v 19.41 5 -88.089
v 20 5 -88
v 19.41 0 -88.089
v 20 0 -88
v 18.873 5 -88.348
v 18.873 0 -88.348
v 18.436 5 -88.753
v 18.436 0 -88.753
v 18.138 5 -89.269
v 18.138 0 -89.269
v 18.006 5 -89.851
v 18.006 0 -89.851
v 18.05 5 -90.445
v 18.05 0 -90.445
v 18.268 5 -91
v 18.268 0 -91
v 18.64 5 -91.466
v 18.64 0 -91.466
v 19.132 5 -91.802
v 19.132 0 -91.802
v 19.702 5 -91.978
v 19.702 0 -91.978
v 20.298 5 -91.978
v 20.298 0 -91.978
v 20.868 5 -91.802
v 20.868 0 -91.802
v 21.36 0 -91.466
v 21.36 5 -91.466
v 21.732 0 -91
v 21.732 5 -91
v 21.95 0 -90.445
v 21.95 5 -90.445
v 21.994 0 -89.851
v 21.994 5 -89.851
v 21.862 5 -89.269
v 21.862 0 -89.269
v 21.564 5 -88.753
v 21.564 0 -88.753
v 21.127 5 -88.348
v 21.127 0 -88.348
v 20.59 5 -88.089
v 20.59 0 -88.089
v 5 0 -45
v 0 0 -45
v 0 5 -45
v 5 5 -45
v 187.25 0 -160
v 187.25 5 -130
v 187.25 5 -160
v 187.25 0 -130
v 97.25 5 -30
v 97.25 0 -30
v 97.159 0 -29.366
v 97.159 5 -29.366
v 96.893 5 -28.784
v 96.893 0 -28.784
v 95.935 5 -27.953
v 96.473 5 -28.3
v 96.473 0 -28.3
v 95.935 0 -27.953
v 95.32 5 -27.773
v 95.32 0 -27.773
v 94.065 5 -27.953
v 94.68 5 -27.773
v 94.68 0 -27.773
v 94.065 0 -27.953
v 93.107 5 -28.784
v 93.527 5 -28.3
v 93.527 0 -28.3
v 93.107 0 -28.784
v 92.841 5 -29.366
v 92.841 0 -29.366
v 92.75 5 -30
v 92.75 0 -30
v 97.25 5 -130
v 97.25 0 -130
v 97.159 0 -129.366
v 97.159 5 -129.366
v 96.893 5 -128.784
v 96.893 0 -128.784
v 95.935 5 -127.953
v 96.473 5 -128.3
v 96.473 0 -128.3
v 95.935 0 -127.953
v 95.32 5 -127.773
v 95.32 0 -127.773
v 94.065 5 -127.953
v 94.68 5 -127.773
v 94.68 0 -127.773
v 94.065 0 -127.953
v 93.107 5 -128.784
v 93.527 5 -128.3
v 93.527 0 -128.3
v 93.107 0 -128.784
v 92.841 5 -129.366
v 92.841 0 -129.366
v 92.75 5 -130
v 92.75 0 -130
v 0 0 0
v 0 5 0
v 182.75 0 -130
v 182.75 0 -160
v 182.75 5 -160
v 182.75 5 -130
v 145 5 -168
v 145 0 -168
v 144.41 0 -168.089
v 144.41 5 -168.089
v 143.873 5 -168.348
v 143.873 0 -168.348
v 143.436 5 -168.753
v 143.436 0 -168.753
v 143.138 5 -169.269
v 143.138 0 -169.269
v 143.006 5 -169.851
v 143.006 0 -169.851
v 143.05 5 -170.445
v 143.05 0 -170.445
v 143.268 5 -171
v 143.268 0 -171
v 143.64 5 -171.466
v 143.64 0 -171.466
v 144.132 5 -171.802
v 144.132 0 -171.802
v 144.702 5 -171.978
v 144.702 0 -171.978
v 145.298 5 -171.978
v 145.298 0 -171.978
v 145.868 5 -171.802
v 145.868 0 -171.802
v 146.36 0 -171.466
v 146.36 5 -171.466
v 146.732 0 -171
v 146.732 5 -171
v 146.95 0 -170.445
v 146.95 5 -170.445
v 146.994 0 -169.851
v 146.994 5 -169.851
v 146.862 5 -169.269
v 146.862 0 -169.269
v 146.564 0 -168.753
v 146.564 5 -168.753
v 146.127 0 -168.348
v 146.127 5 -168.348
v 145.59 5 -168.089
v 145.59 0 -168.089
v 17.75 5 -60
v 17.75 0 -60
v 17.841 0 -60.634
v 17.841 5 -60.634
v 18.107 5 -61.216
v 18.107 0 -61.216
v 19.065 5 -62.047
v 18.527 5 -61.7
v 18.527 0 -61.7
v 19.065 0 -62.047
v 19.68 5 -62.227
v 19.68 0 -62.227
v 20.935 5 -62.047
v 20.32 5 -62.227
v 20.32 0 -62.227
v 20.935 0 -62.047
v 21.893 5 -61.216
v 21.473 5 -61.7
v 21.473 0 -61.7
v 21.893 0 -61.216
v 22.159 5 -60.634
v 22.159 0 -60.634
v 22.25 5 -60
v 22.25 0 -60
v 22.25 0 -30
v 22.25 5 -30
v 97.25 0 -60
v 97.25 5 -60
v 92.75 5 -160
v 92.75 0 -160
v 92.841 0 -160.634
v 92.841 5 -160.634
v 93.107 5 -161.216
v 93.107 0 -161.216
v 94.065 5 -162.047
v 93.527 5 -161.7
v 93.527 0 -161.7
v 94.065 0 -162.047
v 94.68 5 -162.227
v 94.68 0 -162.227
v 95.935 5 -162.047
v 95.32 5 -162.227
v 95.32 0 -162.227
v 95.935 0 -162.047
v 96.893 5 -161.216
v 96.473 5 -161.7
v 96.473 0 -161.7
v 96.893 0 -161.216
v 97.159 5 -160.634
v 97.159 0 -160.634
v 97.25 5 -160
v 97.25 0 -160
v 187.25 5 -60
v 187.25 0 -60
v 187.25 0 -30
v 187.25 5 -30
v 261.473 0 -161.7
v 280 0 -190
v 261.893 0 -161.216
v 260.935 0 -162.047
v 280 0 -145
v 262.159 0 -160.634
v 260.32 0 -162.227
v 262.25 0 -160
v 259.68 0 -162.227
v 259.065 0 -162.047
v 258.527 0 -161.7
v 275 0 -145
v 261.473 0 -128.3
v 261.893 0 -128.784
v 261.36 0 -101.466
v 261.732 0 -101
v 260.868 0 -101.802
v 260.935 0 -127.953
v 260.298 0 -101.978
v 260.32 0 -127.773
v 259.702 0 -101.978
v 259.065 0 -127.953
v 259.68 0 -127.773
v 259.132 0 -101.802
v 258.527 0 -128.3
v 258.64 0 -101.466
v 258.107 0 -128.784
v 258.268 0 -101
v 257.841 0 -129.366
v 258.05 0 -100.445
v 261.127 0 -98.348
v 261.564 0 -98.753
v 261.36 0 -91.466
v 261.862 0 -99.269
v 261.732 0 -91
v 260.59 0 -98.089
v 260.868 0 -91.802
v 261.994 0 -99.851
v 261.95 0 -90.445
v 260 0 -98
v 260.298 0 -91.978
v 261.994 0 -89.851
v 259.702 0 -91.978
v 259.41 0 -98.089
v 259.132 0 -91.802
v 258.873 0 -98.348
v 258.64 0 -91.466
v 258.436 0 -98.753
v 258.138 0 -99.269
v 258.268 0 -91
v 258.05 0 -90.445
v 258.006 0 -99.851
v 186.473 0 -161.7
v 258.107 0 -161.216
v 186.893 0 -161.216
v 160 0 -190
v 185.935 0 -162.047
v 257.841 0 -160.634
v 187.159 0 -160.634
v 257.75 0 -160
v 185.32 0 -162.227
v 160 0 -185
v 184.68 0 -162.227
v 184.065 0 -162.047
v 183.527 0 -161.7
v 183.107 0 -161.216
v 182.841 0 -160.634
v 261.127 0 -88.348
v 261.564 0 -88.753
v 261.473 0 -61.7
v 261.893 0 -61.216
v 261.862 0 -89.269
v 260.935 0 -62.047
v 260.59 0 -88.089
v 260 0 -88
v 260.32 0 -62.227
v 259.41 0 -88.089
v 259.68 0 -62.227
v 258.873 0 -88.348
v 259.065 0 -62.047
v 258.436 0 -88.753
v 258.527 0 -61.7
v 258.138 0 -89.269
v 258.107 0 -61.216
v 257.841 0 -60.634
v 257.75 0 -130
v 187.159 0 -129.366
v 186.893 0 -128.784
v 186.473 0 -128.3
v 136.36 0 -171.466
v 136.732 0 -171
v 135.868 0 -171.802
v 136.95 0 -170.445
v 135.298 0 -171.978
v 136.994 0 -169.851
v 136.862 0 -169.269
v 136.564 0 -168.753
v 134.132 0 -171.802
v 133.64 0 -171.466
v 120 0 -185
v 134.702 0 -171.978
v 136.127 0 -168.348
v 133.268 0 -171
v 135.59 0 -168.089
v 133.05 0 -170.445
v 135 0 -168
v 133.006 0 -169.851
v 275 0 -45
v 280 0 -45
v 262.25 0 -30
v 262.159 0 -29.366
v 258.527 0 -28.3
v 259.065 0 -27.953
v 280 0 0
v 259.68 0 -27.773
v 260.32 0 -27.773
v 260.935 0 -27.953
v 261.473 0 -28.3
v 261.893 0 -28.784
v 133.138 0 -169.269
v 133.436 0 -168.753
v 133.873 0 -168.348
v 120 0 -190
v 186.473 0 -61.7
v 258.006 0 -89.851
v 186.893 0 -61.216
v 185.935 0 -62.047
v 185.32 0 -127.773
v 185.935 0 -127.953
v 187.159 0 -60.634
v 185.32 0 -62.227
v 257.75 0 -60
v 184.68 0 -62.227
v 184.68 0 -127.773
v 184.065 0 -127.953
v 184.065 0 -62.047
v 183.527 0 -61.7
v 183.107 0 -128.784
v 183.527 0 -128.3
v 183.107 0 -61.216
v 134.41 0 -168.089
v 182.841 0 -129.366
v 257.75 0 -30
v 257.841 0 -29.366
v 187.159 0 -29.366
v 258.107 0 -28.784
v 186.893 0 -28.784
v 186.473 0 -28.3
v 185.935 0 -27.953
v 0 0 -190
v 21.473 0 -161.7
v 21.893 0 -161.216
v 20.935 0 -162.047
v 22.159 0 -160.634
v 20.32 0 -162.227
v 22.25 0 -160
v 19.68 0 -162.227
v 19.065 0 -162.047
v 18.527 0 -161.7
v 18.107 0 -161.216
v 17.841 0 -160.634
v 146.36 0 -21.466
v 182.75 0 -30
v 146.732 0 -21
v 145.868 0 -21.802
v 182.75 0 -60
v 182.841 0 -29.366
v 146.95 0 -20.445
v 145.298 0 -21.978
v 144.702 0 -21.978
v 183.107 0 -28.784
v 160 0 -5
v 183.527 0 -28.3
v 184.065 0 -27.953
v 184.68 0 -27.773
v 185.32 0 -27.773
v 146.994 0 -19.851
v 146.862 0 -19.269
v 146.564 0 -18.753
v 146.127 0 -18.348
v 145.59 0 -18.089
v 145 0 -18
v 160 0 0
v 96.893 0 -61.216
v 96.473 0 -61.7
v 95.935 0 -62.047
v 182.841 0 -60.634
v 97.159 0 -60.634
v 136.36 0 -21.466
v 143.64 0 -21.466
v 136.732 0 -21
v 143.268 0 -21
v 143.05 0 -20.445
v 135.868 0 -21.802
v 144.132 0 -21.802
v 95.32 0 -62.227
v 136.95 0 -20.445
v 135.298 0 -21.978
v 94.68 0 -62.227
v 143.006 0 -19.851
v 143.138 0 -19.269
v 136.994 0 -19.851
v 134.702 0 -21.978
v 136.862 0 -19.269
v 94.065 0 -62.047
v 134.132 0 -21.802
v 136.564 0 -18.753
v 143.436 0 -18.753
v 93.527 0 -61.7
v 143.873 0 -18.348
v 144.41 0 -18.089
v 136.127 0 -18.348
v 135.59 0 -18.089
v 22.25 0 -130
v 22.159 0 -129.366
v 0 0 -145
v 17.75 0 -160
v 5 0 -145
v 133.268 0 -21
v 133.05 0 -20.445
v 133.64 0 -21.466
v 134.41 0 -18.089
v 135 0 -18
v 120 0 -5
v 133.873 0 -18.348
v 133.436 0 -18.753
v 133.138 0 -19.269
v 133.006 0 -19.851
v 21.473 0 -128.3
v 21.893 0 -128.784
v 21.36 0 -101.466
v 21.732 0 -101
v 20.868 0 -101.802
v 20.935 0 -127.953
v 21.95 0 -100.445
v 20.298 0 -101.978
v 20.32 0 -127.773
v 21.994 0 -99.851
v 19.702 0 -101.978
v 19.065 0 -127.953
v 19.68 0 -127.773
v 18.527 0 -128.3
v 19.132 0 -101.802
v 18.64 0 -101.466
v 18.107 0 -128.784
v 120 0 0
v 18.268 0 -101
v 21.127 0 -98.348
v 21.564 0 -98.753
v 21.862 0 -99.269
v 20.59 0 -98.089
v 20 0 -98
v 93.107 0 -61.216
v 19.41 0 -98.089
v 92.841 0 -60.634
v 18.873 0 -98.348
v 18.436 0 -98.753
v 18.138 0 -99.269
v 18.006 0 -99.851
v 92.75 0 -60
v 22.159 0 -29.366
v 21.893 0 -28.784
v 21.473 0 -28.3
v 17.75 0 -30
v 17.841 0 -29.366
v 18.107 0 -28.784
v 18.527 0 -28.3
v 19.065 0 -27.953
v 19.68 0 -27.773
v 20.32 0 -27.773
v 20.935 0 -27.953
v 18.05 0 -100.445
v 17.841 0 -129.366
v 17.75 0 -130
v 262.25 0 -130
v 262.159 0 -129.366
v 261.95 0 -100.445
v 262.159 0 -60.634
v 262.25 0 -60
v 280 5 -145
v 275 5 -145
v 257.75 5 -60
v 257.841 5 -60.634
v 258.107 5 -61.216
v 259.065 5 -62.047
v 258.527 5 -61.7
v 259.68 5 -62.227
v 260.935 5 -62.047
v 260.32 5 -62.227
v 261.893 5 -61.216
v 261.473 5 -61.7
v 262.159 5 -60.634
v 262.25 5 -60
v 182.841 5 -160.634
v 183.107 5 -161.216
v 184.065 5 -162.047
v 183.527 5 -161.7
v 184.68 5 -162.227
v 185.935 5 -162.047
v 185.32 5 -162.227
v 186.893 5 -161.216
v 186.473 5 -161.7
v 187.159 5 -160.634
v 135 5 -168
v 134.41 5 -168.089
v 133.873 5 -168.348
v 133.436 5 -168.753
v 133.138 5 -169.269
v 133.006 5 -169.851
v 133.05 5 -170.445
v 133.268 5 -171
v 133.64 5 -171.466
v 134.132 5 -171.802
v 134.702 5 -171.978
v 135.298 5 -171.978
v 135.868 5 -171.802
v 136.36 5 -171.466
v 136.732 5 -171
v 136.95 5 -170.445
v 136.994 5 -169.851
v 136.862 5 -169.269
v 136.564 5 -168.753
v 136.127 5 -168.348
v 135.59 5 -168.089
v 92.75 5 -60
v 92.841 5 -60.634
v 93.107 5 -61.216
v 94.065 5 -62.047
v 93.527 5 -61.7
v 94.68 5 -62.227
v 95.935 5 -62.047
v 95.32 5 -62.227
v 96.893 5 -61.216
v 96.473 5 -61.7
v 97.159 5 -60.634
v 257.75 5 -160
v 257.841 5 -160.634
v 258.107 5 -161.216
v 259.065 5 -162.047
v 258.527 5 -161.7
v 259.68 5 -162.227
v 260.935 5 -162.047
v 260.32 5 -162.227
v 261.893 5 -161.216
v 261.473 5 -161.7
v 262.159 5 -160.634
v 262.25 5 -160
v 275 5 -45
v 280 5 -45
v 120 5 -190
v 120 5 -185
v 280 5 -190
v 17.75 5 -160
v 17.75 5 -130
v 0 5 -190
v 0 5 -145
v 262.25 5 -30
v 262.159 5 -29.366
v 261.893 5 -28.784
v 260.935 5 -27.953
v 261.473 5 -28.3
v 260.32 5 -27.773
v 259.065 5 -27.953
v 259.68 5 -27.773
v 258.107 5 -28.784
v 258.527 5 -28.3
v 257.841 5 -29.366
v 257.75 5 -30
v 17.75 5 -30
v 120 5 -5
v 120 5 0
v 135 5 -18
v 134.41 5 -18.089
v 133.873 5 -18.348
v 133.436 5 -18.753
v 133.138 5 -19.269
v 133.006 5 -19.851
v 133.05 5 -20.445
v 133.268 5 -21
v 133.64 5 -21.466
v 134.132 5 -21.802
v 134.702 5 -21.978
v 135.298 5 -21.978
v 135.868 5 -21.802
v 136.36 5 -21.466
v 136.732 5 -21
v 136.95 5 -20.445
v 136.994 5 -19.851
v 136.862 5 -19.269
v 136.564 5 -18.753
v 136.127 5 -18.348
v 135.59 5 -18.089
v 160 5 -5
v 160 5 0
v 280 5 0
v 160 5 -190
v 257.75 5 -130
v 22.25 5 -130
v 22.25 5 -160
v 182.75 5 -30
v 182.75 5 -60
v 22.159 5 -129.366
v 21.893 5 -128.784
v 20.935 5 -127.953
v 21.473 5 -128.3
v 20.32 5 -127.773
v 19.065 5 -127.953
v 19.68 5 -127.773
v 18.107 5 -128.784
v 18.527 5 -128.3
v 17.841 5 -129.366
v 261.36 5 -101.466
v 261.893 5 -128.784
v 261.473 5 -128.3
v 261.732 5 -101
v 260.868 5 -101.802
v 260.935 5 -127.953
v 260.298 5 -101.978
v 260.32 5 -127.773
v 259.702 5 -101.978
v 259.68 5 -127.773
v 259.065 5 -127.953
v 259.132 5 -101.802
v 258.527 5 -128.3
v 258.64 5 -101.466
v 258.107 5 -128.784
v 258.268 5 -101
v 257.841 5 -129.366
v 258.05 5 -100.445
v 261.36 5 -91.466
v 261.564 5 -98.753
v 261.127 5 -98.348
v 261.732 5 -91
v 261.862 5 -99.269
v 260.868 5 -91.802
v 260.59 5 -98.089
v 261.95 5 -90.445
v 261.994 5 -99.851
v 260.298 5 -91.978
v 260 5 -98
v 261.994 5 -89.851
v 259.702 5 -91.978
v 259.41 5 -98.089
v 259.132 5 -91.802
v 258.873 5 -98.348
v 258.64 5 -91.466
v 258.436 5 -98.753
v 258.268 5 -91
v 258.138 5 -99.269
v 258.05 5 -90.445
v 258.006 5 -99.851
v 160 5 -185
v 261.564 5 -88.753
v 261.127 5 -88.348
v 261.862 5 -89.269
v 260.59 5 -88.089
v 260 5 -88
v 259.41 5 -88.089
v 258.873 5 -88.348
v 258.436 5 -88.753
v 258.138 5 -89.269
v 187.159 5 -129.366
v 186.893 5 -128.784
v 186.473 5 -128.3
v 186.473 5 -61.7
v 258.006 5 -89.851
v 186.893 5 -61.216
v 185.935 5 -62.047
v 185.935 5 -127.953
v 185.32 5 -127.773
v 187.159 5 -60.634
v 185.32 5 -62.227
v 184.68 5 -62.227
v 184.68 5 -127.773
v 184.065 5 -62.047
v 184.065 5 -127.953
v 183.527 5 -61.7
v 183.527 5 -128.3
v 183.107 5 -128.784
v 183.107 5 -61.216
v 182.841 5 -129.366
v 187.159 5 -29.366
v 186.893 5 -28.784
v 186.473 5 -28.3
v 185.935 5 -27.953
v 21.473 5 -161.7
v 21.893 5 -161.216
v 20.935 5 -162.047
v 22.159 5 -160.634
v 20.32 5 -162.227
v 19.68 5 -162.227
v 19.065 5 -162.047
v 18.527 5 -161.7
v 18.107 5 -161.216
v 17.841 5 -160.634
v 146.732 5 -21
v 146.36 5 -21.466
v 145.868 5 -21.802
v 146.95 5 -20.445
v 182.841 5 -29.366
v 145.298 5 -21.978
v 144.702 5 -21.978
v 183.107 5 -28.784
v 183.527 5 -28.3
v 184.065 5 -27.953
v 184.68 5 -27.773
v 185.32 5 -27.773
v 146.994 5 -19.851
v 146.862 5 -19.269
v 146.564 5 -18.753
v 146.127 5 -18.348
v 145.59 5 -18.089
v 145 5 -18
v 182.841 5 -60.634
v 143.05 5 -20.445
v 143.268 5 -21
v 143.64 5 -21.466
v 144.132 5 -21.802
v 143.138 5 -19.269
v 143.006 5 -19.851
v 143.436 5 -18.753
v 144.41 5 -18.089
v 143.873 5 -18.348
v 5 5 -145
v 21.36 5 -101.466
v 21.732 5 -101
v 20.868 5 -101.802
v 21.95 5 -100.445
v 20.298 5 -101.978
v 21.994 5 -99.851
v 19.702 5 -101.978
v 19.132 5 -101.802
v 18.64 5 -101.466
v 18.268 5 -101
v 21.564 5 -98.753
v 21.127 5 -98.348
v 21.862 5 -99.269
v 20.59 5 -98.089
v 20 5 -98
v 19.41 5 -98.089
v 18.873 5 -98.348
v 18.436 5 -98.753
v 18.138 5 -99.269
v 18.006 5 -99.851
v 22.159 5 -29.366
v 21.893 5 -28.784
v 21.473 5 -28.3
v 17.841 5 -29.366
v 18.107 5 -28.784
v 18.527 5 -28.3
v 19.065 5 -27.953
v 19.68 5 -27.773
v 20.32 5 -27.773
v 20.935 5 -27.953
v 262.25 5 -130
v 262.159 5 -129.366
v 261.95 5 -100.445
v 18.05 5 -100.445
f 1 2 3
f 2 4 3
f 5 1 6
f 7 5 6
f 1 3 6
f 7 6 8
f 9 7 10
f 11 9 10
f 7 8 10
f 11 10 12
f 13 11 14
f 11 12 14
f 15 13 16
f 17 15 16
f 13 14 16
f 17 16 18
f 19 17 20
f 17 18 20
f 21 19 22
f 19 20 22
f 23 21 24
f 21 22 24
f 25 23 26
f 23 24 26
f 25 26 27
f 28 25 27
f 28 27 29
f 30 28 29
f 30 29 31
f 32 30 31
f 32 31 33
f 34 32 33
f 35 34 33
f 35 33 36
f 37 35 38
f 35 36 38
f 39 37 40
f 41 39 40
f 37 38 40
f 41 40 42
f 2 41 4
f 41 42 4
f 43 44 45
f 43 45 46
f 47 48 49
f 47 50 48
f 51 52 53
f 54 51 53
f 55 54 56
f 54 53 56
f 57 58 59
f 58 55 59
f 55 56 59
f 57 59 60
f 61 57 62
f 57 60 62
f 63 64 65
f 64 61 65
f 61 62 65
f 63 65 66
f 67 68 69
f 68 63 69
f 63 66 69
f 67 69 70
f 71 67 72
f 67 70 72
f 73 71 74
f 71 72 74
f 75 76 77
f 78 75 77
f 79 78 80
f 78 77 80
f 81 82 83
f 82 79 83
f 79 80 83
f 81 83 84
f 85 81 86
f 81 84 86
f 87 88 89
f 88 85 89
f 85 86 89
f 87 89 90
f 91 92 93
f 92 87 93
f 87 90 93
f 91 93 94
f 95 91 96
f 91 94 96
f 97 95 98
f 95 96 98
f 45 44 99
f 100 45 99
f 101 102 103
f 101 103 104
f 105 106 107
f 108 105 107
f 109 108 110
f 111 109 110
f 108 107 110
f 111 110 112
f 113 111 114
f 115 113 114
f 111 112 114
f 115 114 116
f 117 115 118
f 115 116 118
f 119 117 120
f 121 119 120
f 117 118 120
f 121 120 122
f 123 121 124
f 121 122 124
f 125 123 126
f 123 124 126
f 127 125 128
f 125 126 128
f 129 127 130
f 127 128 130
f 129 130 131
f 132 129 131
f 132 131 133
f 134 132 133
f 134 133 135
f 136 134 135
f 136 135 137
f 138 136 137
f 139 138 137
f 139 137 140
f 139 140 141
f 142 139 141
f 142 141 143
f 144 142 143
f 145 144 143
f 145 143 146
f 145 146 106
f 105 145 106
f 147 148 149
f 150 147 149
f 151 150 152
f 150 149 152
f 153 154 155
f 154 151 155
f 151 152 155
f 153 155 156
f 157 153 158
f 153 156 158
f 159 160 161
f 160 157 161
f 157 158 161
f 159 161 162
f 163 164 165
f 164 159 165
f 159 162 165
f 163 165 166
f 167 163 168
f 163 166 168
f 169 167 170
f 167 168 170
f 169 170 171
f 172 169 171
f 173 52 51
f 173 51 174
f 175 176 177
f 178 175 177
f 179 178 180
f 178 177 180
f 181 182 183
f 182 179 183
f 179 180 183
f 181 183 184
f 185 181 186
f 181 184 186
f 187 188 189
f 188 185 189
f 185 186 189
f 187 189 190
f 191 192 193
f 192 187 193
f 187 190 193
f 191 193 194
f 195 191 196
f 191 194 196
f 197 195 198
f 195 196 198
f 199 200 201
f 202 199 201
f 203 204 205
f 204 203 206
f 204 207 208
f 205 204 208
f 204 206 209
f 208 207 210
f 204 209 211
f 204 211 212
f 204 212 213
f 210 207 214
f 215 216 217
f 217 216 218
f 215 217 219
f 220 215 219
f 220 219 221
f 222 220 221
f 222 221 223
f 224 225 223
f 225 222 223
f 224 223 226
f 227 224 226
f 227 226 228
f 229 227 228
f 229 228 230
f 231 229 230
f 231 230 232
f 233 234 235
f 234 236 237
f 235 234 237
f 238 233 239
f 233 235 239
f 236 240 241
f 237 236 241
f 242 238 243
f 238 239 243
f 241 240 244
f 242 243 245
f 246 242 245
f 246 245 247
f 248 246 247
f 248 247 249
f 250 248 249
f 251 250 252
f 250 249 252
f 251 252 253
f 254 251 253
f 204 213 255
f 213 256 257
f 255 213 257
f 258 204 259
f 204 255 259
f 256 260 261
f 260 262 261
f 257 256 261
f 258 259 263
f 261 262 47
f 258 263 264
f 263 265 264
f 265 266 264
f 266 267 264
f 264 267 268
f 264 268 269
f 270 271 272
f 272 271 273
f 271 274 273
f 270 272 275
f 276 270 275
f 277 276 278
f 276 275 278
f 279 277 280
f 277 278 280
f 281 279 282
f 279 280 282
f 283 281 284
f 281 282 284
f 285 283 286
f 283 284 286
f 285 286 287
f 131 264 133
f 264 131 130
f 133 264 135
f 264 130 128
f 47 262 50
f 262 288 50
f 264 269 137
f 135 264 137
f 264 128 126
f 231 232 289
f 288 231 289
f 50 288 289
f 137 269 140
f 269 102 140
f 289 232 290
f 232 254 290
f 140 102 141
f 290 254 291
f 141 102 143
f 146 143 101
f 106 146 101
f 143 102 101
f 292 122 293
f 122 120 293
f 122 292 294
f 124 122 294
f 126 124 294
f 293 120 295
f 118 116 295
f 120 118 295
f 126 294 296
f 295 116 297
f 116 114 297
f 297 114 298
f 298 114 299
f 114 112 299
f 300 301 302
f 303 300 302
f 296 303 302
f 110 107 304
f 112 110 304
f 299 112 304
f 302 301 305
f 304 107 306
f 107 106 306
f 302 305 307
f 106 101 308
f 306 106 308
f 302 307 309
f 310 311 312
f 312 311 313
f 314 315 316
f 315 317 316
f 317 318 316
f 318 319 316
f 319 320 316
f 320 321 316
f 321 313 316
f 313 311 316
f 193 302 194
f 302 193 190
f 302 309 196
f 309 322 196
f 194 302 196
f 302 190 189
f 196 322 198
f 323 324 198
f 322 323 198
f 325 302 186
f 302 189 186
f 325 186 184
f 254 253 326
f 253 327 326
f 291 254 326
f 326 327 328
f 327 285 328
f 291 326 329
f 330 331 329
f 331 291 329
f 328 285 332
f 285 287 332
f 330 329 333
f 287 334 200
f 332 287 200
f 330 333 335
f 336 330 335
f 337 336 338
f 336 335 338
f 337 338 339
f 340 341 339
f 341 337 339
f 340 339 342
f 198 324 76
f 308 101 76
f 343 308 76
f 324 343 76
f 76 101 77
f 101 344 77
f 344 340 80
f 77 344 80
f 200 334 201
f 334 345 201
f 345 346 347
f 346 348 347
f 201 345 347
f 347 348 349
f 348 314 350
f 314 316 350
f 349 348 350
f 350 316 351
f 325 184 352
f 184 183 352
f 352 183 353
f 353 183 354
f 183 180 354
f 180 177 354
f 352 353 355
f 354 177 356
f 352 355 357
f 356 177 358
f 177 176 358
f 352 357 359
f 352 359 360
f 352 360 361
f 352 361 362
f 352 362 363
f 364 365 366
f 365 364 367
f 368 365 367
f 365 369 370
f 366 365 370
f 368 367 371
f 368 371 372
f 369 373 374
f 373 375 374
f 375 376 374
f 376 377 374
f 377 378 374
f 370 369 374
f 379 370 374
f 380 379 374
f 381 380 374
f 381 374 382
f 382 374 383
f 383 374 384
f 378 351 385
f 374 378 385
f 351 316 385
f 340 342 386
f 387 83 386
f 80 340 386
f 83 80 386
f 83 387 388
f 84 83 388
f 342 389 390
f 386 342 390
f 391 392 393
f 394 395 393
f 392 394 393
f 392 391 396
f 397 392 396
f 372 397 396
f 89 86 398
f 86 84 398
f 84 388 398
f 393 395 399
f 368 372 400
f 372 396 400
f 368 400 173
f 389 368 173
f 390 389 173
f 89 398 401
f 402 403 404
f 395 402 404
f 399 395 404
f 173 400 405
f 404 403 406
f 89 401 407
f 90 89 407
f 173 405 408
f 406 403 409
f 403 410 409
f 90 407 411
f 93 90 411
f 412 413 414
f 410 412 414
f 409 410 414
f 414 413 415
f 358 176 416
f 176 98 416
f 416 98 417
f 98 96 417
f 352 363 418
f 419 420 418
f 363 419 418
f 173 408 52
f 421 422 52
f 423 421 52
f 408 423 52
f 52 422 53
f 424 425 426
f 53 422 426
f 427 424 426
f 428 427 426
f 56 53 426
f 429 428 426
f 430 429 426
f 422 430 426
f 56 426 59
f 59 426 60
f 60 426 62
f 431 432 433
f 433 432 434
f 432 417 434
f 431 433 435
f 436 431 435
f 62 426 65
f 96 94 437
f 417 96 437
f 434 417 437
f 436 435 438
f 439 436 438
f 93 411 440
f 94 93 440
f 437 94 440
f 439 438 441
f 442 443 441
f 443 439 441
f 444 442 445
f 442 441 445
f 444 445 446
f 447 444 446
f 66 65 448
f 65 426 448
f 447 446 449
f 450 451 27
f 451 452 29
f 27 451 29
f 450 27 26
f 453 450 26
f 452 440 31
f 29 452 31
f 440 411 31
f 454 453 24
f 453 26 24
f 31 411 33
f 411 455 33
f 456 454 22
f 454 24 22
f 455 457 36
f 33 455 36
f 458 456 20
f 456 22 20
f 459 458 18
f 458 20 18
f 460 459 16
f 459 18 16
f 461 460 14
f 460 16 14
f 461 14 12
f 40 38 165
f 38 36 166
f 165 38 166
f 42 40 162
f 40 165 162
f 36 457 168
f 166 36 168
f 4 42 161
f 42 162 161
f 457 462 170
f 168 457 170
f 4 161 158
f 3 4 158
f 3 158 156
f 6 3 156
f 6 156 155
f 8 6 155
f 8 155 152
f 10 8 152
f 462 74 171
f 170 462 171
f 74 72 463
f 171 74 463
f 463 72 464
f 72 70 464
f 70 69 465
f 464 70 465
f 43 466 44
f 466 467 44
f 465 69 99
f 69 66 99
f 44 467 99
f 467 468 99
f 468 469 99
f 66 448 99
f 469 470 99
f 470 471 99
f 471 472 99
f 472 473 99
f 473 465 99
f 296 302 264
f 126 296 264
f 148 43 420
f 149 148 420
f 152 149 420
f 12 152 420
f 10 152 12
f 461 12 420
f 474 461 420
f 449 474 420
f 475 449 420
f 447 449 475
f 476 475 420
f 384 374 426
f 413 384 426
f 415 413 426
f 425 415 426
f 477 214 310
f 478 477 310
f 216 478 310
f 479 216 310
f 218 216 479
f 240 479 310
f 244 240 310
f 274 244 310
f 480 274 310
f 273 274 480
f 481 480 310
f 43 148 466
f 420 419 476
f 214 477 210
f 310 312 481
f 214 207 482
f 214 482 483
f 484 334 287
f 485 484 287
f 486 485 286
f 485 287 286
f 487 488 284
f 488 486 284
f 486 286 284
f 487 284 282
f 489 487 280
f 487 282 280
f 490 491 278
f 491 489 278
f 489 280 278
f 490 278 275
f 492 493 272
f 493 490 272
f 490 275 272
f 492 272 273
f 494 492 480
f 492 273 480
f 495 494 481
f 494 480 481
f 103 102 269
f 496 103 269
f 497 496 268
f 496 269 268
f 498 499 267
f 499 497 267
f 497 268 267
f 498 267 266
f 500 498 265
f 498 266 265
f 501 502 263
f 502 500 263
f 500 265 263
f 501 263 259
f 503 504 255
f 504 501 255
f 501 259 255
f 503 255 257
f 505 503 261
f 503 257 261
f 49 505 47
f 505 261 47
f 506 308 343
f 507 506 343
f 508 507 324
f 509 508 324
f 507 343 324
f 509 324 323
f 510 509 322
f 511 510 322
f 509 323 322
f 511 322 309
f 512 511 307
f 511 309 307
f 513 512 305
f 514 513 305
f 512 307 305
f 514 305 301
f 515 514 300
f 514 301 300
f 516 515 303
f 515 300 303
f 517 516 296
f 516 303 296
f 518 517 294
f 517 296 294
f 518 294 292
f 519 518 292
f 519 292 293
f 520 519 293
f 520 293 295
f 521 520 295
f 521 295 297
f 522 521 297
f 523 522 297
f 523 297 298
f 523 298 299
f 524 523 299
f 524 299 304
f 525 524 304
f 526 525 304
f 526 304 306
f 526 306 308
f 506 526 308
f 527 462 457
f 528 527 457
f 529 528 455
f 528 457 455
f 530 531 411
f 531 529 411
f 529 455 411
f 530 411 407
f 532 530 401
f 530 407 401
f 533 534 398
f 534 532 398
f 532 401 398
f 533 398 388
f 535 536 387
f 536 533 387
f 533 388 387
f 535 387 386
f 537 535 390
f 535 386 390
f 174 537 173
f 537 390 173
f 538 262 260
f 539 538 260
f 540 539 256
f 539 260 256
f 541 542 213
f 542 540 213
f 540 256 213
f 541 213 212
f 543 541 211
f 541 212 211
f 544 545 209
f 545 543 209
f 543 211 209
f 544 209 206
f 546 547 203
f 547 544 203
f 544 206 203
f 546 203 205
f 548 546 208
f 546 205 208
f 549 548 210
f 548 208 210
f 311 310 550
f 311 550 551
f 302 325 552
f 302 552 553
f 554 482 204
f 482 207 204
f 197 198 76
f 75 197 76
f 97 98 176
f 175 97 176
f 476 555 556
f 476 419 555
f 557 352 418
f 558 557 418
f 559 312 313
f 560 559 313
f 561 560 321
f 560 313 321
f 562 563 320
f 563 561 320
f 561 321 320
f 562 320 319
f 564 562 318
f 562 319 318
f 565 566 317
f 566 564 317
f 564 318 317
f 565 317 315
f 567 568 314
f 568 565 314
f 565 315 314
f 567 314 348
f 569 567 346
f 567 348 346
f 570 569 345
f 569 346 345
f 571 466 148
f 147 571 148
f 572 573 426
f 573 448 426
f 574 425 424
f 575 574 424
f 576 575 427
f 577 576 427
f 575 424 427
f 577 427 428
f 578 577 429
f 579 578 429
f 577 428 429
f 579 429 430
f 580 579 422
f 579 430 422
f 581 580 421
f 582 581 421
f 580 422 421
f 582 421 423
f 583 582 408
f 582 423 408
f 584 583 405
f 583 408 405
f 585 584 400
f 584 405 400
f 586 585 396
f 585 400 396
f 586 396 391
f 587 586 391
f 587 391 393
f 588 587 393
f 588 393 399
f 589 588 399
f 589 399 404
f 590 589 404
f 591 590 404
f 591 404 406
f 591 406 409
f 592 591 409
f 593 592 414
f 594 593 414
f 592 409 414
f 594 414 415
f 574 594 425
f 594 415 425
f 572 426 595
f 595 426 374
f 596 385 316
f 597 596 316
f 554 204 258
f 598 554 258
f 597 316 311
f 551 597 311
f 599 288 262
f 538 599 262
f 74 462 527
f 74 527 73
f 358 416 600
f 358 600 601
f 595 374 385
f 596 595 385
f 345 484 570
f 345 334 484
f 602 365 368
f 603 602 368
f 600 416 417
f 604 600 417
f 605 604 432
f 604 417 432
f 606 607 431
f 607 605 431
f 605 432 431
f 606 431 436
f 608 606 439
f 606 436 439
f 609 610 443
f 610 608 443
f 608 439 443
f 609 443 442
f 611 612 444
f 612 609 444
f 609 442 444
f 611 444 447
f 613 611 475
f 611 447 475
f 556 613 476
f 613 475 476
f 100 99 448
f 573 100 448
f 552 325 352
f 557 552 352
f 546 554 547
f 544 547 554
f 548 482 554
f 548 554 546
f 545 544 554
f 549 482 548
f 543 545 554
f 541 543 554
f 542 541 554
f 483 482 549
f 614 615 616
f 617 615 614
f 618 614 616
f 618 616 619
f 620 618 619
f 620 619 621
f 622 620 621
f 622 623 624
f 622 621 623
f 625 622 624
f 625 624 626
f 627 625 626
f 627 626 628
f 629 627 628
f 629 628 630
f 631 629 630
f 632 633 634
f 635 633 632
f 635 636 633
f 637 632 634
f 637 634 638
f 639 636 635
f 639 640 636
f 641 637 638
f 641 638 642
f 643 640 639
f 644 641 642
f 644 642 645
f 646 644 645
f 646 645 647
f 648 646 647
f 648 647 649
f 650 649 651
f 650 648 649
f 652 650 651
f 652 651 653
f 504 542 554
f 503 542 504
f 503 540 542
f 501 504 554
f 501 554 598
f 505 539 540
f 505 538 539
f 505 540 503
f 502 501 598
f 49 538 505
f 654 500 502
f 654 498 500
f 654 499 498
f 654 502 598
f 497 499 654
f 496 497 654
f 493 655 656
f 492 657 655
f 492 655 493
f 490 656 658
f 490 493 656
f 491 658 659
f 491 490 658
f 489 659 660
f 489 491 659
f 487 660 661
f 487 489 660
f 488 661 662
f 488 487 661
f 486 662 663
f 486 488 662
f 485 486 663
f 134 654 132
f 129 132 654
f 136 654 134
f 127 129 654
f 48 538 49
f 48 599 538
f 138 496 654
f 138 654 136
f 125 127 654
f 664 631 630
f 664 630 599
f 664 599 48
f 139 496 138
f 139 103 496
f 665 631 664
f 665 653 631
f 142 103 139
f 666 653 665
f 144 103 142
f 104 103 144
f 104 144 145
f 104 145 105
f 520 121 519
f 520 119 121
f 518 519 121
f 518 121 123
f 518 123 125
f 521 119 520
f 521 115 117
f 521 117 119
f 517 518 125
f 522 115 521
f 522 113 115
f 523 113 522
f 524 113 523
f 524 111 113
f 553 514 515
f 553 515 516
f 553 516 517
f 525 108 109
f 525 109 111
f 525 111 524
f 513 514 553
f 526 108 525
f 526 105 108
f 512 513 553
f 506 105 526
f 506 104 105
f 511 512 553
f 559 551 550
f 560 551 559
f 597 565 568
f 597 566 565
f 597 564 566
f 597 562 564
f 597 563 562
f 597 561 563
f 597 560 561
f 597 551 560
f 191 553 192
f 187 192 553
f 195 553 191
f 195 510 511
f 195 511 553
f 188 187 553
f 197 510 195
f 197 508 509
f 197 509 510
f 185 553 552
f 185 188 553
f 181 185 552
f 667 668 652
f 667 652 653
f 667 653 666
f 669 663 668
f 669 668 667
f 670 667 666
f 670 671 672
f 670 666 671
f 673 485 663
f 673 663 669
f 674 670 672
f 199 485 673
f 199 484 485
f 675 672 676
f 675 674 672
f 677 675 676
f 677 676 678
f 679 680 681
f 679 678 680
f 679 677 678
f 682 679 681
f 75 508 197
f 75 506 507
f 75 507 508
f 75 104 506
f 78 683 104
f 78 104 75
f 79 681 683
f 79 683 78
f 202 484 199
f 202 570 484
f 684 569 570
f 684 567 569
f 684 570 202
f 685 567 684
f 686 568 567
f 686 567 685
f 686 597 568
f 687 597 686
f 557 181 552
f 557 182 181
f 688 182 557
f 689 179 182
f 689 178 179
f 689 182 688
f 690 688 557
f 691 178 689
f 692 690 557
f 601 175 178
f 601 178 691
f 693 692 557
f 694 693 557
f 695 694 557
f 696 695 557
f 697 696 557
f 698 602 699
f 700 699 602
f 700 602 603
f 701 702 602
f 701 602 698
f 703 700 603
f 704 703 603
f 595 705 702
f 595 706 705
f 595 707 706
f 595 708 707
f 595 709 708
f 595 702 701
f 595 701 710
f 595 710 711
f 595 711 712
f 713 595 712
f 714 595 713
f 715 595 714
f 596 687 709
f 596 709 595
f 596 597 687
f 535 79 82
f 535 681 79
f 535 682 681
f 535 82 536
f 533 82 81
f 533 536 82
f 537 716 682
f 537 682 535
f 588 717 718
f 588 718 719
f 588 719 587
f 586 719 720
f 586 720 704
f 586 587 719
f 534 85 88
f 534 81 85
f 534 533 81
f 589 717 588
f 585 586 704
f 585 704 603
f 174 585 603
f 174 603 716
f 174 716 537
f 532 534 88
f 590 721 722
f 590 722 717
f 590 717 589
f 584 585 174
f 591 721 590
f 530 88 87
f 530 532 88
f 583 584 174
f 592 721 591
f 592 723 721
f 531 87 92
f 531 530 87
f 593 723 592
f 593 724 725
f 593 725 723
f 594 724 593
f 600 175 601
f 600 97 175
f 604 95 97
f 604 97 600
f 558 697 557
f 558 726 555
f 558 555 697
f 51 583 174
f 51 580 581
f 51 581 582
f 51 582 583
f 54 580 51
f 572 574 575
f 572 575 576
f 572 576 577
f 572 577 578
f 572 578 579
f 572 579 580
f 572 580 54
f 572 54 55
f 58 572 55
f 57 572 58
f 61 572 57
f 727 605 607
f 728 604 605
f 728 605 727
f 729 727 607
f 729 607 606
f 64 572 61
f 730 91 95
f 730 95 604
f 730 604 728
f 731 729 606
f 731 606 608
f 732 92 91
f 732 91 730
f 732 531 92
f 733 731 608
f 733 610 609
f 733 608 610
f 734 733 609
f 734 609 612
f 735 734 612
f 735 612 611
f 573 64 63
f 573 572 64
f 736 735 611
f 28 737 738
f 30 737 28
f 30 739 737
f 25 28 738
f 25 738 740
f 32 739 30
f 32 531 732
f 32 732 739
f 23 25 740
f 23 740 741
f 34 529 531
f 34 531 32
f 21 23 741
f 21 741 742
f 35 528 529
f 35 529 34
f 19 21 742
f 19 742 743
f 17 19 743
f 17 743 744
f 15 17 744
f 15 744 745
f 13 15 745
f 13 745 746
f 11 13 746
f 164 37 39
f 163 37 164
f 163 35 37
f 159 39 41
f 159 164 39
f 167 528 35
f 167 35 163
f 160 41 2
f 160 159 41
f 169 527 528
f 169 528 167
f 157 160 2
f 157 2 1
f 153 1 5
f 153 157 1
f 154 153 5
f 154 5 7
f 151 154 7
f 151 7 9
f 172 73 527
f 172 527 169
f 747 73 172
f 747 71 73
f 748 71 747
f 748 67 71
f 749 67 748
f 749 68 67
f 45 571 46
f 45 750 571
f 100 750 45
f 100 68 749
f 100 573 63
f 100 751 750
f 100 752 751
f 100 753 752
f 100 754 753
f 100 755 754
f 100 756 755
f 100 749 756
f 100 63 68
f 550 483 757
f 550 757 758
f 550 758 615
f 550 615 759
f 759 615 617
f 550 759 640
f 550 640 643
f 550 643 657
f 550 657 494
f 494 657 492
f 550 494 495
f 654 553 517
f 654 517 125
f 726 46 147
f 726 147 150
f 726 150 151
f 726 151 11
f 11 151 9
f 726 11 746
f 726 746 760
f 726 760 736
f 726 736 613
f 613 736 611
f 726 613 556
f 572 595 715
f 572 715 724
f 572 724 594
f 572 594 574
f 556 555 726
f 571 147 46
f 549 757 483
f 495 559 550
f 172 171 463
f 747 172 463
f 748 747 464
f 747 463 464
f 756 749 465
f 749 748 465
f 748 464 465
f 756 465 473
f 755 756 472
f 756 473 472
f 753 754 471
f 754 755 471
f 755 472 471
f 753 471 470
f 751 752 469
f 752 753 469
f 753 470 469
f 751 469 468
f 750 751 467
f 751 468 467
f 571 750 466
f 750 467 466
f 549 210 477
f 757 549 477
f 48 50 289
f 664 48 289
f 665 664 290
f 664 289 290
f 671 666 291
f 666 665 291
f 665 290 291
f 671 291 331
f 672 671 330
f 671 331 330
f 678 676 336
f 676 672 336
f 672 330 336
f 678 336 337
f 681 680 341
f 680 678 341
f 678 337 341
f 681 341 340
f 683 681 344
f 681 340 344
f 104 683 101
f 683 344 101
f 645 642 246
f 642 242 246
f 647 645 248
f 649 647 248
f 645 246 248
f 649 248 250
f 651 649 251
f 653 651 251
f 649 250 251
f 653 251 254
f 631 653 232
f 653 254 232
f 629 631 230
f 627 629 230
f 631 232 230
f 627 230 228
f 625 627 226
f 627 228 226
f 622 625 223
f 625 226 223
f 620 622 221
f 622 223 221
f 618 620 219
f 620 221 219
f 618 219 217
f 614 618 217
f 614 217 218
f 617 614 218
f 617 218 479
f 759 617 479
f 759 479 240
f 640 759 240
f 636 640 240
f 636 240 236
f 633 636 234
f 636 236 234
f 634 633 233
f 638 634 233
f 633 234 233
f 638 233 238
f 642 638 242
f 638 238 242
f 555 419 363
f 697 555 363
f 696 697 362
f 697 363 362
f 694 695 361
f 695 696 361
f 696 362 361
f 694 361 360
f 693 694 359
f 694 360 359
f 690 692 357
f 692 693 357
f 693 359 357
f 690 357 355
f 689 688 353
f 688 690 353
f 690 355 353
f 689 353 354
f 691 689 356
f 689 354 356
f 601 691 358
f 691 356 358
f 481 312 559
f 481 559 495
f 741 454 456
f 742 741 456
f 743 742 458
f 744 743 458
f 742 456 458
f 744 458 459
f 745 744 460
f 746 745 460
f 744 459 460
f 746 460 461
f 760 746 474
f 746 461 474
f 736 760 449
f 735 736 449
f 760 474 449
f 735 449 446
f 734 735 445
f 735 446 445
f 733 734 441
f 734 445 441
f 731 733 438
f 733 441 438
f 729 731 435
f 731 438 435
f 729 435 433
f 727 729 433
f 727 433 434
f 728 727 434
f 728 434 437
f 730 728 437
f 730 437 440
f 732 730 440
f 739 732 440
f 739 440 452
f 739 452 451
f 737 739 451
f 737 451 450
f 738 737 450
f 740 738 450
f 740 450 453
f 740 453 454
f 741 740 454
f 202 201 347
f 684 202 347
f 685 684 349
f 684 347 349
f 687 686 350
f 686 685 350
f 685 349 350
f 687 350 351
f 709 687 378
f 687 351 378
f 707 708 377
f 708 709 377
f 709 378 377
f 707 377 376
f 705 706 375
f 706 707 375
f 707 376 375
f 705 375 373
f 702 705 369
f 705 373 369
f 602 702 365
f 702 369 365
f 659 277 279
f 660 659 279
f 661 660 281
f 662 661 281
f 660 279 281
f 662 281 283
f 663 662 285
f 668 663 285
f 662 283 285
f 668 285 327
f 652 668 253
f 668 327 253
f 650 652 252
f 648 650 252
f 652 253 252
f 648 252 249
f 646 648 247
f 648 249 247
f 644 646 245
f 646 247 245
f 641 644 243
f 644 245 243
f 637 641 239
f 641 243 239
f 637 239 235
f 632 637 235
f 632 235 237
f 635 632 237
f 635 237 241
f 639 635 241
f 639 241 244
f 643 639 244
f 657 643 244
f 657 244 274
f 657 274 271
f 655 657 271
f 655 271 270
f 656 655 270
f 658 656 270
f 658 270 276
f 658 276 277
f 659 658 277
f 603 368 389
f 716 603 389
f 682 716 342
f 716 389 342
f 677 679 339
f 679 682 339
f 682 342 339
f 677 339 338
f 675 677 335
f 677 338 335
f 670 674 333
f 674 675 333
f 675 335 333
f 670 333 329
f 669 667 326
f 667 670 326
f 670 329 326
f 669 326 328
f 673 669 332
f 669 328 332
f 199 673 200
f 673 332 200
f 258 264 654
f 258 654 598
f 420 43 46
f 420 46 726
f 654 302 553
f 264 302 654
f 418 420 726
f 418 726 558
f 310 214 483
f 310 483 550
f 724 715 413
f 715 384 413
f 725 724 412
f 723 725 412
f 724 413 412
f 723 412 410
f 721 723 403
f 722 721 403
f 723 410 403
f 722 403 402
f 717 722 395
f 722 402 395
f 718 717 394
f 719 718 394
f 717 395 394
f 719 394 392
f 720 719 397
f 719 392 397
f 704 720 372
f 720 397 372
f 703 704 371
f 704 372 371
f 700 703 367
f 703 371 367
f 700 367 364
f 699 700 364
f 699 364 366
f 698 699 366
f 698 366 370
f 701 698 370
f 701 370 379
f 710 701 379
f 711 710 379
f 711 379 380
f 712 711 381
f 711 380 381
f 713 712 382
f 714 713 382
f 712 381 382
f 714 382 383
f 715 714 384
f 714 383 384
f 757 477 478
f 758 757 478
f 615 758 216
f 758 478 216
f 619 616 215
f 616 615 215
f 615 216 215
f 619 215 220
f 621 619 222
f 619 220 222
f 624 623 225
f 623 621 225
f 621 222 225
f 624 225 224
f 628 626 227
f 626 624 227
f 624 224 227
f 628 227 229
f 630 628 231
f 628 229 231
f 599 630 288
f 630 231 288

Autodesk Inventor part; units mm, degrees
ref_plane "YZ Plane" through (0, 0, 0) normal (1, 0, 0) x (0, 1, 0)
ref_plane "XZ Plane" through (0, 0, 0) normal (0, 1, 0) x (-1, 0, 0)
ref_plane "XY Plane" through (0, 0, 0) normal (0, 0, 1) x (1, 0, 0)
sketch "Sketch1" plane through (0, 0, 0) normal (0, 1, 0) x (-1, 0, 0)
  line L0 (0, 0) -> (-280, 0)
  line L1 (-280, 0) -> (-280, -190)
  line L2 (-280, -190) -> (0, -190)
  line L3 (5, -95) -> (-280, -95) construction
  line L4 (-140, 0) -> (-140, -190) construction
  line L5 (-57.5, 0) -> (-57.5, -190) construction
  line L6 (-203, 0) -> (-203, -190) construction
  line L7 (-20, -160) -> (-20, -130) construction
  line L8 (-20, -160) -> (-20, -130) construction
  line L9 (-17.75, -160) -> (-17.75, -130)
  line L10 (-22.25, -130) -> (-22.25, -160)
  arc A0 (-22.25, -160) -> (-17.75, -160) centre (-20, -160) ccw
  arc A1 (-17.75, -130) -> (-22.25, -130) centre (-20, -130) ccw
  line L11 (-95, -160) -> (-95, -130) construction
  line L12 (-95, -160) -> (-95, -130) construction
  line L13 (-97.25, -160) -> (-97.25, -130)
  line L14 (-92.75, -130) -> (-92.75, -160)
  arc A2 (-97.25, -160) -> (-92.75, -160) centre (-95, -160) ccw
  arc A3 (-92.75, -130) -> (-97.25, -130) centre (-95, -130) ccw
  line L15 (-160, -190) -> (-120, -190)
  line L16 (-120, -190) -> (-120, -185)
  line L17 (-120, -185) -> (-160, -185)
  line L18 (-160, -185) -> (-160, -190)
  line L19 (-260, -160) -> (-260, -130) construction
  line L20 (-260, -160) -> (-260, -130) construction
  line L21 (-262.25, -160) -> (-262.25, -130)
  line L22 (-257.75, -130) -> (-257.75, -160)
  arc A4 (-262.25, -160) -> (-257.75, -160) centre (-260, -160) ccw
  arc A5 (-257.75, -130) -> (-262.25, -130) centre (-260, -130) ccw
  line L23 (-187.25, -130) -> (-187.25, -160)
  line L24 (-185, -160) -> (-185, -130) construction
  line L25 (-182.75, -160) -> (-182.75, -130)
  arc A6 (-187.25, -160) -> (-182.75, -160) centre (-185, -160) ccw
  line L26 (-185, -160) -> (-185, -130) construction
  arc A7 (-182.75, -130) -> (-187.25, -130) centre (-185, -130) ccw
  line L27 (-140, -190) -> (-140, 0) construction
  line L28 (-20, -30) -> (-20, -60) construction
  line L29 (-20, -30) -> (-20, -60) construction
  line L30 (-17.75, -30) -> (-17.75, -60)
  line L31 (-22.25, -60) -> (-22.25, -30)
  arc A8 (-17.75, -30) -> (-22.25, -30) centre (-20, -30) ccw
  arc A9 (-22.25, -60) -> (-17.75, -60) centre (-20, -60) ccw
  line L32 (-92.75, -60) -> (-92.75, -30)
  line L33 (-95, -30) -> (-95, -60) construction
  line L34 (-97.25, -30) -> (-97.25, -60)
  arc A10 (-92.75, -30) -> (-97.25, -30) centre (-95, -30) ccw
  line L35 (-95, -30) -> (-95, -60) construction
  arc A11 (-97.25, -60) -> (-92.75, -60) centre (-95, -60) ccw
  line L36 (-160, 0) -> (-120, 0)
  line L37 (-120, 0) -> (-120, -5)
  line L38 (-120, -5) -> (-160, -5)
  line L39 (-160, -5) -> (-160, 0)
  arc A12 (-257.75, -30) -> (-262.25, -30) centre (-260, -30) ccw
  line L40 (-257.75, -60) -> (-257.75, -30)
  line L41 (-260, -30) -> (-260, -60) construction
  line L42 (-260, -30) -> (-260, -60) construction
  arc A13 (-262.25, -60) -> (-257.75, -60) centre (-260, -60) ccw
  line L43 (-262.25, -30) -> (-262.25, -60)
  line L44 (-187.25, -60) -> (-187.25, -30)
  line L45 (-185, -30) -> (-185, -60) construction
  line L46 (-185, -30) -> (-185, -60) construction
  arc A14 (-187.25, -60) -> (-182.75, -60) centre (-185, -60) ccw
  line L47 (-182.75, -30) -> (-182.75, -60)
  arc A15 (-182.75, -30) -> (-187.25, -30) centre (-185, -30) ccw
  line L48 (-280, -42.5) -> (-280, -92.5)
  line L49 (-280, -92.5) -> (-280, -145)
  line L50 (-280, -145) -> (-275, -145)
  line L51 (-275, -145) -> (-275, -45)
  line L52 (-275, -45) -> (-280, -45)
  line L53 (-280, -45) -> (-280, -42.5)
  line L54 (5, -45) -> (-5, -45)
  line L55 (-5, -45) -> (-5, -145)
  line L56 (-5, -145) -> (5, -145)
  line L57 (0, -190) -> (0, 0)
  point P0 (-20, -145)
  point P1 (-95, -145)
  point P2 (-260, -145)
  point P3 (-185, -145)
  point P4 (-20, -45)
  point P5 (-95, -45)
  point P6 (-260, -45)
  point P7 (-185, -45)
  point P8 (-95, -145)
  point P9 (-20, -145)
  point P10 (-280, -45)
  point P11 (-160, -190)
  point P12 (-120, -190)
  point P13 (-120, 0)
  point P14 (-160, 0)
  point P15 (-260, -145)
  point P16 (0, -45)
  point P17 (0, -145)
  dimension "d2" = 30
  dimension "d4" = 30
  dimension "d6" = 2.25
  dimension "d9" = 40
  dimension "d13" = 0
  dimension "d14" = 5
  dimension "d16" = 20
  dimension "d21" = 10
  dimension "d22" = 5
  dimension "d26" = 50
  dimension "d27" = 50
  dimension "d28" = 0
  dimension "d30" = 190
  dimension "d32" = 75
  dimension "d34" = 100
  dimension "d36" = 50
  dimension "d56" = 20
  dimension "d57" = 280
extrude "Extrusion1" add sketch "Sketch1" along normal blind 5 contours L57 L54 L55 L56 L2 L16 L17 L18 L1 L50 L51 L52 L0 L39 L38 L37
sketch "Sketch2" plane through (0, 5, 0) normal (0, 1, 0) x (1, 0, 0)
  line L0 (160, 185) -> (120, 185) projected
  line L1 (120, 185) -> (120, 190) projected
  line L2 (160, 5) -> (160, 0) projected
  line L3 (160, 0) -> (280, 0) projected
  line L4 (5, 145) -> (5, 45) projected
  point P0 (0, 0)
  point P1 (135, 20)
  point P2 (145, 20)
  point P3 (135, 170)
  point P4 (145, 170)
  point P5 (20, 90)
  point P6 (20, 100)
  dimension "d44" = 10
  dimension "d45" = 10
  dimension "d46" = 10
  dimension "d47" = 15
  dimension "d48" = 15
  dimension "d49" = 15
  dimension "d50" = 15
  dimension "d51" = 20
  dimension "d52" = 20
  dimension "d53" = 15
  dimension "d54" = 15
  dimension "d55" = 45
hole "Hole1" at (135, 5, -20) at (145, 5, -20) at (135, 5, -170) at (145, 5, -170) at (20, 5, -90) at (20, 5, -100) direction (0, -1, 0) diameter 4 end through all
sketch "Sketch3" plane through (0, 5, 0) normal (0, 1, 0) x (1, 0, 0)
  line L0 (275, 145) -> (280, 145) projected
  line L1 (275, 45) -> (275, 145) projected
  point P0 (0, 0)
  point P1 (260, 90)
  point P2 (260, 100)
  dimension "d65" = 45
  dimension "d66" = 10
  dimension "d67" = 15
  dimension "d68" = 15
hole "Hole2" at (260, 5, -90) at (260, 5, -100) direction (0, -1, 0) diameter 4 end through all
properties part number "base_2"
